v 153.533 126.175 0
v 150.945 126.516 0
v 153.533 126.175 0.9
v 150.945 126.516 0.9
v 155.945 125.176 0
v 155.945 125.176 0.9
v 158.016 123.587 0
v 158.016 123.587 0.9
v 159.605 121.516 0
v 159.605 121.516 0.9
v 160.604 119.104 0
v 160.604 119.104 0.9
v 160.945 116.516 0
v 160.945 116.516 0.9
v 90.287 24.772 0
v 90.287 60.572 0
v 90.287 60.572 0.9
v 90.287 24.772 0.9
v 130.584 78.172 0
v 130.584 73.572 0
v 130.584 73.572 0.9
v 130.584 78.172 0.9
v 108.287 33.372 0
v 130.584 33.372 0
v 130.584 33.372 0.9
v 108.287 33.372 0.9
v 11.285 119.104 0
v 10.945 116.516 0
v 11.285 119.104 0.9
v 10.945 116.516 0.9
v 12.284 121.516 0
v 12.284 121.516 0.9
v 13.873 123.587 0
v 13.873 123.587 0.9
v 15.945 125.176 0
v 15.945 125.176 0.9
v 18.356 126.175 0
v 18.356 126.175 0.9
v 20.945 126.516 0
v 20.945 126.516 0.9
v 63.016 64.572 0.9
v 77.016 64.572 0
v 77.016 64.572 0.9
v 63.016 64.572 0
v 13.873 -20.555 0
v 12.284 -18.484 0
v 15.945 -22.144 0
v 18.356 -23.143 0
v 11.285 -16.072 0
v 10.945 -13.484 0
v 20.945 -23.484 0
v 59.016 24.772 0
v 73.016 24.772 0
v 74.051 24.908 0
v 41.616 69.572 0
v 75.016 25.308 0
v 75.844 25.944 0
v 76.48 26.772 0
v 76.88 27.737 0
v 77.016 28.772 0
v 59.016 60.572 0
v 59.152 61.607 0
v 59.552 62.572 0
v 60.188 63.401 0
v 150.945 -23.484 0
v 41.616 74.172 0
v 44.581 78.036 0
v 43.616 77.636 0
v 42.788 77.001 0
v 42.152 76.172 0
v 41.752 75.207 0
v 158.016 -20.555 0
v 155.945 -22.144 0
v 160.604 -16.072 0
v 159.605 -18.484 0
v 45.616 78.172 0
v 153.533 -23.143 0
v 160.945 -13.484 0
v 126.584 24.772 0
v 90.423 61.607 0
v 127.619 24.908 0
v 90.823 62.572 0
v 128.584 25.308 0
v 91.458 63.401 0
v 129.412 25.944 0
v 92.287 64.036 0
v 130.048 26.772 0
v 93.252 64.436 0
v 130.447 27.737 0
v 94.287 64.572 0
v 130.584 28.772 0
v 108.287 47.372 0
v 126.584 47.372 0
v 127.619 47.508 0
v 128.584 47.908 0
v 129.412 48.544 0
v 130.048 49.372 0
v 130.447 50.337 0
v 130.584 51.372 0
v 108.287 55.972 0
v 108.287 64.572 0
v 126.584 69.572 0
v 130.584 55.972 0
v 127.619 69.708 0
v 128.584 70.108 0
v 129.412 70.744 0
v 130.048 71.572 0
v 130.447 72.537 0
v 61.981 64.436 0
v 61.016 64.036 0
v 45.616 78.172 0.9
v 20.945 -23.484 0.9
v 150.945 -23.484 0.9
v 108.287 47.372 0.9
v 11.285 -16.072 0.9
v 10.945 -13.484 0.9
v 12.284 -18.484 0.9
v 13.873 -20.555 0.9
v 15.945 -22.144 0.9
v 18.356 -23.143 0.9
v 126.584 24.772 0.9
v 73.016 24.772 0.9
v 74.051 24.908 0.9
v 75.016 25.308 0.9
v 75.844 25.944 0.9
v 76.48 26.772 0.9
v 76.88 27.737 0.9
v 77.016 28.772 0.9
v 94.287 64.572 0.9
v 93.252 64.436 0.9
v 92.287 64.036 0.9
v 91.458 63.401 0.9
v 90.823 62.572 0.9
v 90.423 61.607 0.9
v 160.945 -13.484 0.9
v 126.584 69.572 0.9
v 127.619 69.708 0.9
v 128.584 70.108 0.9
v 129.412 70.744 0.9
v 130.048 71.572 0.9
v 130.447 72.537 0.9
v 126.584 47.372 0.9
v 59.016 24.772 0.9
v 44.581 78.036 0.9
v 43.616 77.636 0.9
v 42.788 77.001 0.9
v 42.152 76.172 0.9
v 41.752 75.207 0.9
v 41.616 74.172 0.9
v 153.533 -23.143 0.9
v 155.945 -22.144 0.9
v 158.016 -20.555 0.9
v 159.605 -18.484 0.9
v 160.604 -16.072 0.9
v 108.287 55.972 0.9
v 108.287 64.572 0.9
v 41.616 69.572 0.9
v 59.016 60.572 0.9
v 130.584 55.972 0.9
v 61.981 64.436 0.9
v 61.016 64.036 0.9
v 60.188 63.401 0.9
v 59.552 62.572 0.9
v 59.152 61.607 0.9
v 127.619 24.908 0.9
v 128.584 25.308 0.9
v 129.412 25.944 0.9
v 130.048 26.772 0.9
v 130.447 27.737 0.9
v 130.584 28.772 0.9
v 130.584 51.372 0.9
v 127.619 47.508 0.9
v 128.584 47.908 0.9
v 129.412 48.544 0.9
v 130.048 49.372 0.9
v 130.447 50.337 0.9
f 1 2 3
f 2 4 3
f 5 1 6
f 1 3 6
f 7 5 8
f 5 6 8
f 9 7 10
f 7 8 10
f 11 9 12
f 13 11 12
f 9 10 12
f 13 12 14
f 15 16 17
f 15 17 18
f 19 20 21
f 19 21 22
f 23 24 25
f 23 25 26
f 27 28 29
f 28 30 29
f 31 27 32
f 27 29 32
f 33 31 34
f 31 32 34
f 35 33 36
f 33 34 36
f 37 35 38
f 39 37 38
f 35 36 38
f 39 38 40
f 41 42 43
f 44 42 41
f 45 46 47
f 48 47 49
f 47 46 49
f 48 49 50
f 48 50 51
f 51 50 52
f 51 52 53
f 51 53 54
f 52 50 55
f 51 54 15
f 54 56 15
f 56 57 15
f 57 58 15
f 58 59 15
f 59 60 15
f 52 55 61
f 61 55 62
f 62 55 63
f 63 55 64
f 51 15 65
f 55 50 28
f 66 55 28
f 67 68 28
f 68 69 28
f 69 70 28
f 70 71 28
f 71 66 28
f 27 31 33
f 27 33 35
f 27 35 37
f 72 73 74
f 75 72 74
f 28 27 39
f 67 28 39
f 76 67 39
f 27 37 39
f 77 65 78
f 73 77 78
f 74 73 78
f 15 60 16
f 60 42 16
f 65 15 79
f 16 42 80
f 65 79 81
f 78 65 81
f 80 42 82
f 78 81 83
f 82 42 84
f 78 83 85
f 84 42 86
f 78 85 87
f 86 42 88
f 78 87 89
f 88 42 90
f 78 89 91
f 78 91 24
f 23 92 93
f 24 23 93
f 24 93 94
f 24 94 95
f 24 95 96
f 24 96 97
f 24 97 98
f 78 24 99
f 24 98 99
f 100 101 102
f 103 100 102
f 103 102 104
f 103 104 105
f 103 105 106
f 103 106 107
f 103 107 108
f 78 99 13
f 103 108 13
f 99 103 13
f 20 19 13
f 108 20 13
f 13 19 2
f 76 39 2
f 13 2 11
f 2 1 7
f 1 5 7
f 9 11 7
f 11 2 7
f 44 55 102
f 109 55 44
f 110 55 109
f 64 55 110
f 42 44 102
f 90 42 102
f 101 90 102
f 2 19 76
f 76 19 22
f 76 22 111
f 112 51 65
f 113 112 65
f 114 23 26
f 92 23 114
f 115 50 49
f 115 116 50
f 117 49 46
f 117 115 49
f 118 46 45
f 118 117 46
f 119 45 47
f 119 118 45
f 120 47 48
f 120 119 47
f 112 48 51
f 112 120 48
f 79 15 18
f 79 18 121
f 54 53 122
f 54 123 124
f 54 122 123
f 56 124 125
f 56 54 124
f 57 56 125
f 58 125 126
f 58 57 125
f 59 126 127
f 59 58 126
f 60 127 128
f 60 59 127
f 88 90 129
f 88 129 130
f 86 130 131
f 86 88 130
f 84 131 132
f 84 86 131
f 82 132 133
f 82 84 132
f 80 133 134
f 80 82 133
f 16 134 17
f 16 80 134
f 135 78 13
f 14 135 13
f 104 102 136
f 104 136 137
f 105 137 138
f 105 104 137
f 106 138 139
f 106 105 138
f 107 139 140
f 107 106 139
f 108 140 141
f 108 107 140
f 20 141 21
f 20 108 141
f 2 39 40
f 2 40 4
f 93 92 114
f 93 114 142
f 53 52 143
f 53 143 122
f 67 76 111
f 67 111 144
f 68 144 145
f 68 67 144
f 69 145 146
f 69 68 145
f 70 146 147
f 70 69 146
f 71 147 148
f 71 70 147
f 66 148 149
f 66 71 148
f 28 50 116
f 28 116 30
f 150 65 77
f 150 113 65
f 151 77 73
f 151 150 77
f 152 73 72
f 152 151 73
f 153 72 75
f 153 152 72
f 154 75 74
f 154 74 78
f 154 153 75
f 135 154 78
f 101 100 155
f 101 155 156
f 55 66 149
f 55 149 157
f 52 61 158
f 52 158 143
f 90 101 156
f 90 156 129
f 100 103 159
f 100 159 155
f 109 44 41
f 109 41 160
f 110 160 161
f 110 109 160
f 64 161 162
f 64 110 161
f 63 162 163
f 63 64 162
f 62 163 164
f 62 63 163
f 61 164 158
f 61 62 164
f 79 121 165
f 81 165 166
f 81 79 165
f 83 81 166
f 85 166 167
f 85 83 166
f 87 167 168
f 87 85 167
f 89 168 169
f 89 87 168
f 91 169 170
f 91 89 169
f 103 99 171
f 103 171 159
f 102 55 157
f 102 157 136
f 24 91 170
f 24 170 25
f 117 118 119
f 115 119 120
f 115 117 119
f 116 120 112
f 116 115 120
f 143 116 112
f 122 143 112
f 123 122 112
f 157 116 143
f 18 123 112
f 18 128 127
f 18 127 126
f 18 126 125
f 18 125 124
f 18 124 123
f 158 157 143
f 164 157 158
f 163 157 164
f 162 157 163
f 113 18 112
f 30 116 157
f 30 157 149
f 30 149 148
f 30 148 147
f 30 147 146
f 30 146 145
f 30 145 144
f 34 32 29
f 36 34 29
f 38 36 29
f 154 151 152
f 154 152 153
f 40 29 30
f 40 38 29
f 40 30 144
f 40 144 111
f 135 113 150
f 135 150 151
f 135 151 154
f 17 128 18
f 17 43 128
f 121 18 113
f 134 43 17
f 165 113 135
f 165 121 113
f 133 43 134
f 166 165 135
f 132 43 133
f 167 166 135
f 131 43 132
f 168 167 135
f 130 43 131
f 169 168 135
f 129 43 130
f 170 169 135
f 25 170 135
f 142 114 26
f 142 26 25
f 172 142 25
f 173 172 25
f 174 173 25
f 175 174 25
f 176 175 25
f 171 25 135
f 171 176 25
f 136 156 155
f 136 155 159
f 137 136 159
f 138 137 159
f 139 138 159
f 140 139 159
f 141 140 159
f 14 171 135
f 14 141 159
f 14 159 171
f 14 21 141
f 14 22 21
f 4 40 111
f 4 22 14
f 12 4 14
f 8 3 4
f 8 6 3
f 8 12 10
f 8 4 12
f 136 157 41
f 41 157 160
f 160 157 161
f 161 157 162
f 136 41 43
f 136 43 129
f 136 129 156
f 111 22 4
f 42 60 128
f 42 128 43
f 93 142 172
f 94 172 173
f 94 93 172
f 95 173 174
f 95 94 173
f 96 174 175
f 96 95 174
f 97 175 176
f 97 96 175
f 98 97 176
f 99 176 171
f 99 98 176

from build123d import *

# Parameters (mm, degrees)
F1_W     = 75
F1_H     = 75
F2_DEPTH = 0.45
F3_DEPTH = 0.451
F4_SCALE = 2
F5_R     = 10


with BuildPart() as f2:
    # F1 (on Top) → F2 (new body)
    with BuildSketch(Plane.XY):
        with Locations((42.972257086, 25.7581188657)):
            Rectangle(F1_W, F1_H)
    extrude(amount=F2_DEPTH)

    # F0 (on Top) → F3 (cut, through all)
    with BuildSketch(Plane.XY):
        with BuildLine():
            Line((20.8079852164, 34.7860567272), (63.291762352, 34.7860567272))
            ThreePointArc((63.291762352, 34.7860567272), (64.7059759144, 35.3718431648), (65.291762352, 36.7860567272))
            Line((65.291762352, 36.7860567272), (65.291762352, 39.0860567272))
            Line((65.291762352, 39.0860567272), (22.8079852164, 39.0860567272))
            ThreePointArc((22.8079852164, 39.0860567272), (21.393771654, 38.5002702895), (20.8079852164, 37.0860567272))
            Line((20.8079852164, 37.0860567272), (20.8079852164, 34.7860567272))
        make_face()
        with BuildLine():
            Line((38.5079852164, 14.3860567272), (38.5079852164, 32.2860567272))
            Line((38.5079852164, 32.2860567272), (31.5079852164, 32.2860567272))
            ThreePointArc((31.5079852164, 32.2860567272), (30.093771654, 31.7002702895), (29.5079852164, 30.2860567272))
            Line((29.5079852164, 30.2860567272), (29.5079852164, 12.3860567272))
            Line((29.5079852164, 12.3860567272), (36.5079852164, 12.3860567272))
            ThreePointArc((36.5079852164, 12.3860567272), (37.9221987788, 12.9718431648), (38.5079852164, 14.3860567272))
        make_face()
        with BuildLine():
            Line((54.1434029907, 27.9860567272), (54.1434029907, 32.2860567272))
            Line((54.1434029907, 32.2860567272), (47.1434029907, 32.2860567272))
            ThreePointArc((47.1434029907, 32.2860567272), (45.7291894283, 31.7002702895), (45.1434029907, 30.2860567272))
            Line((45.1434029907, 30.2860567272), (45.1434029907, 12.3860567272))
            Line((45.1434029907, 12.3860567272), (54.1434029907, 12.3860567272))
            Line((54.1434029907, 12.3860567272), (54.1434029907, 16.6860567272))
            Line((54.1434029907, 16.6860567272), (54.1434029907, 23.6860567272))
            Line((54.1434029907, 23.6860567272), (54.1434029907, 27.9860567272))
        make_face()
        with BuildLine():
            Line((65.291762352, 27.9860567272), (54.1434029907, 27.9860567272))
            Line((54.1434029907, 27.9860567272), (54.1434029907, 23.6860567272))
            Line((54.1434029907, 23.6860567272), (63.291762352, 23.6860567272))
            ThreePointArc((63.291762352, 23.6860567272), (64.7059759144, 24.2718431648), (65.291762352, 25.6860567272))
            Line((65.291762352, 25.6860567272), (65.291762352, 27.9860567272))
        make_face()
        with BuildLine():
            Line((65.291762352, 16.6860567272), (54.1434029907, 16.6860567272))
            Line((54.1434029907, 16.6860567272), (54.1434029907, 12.3860567272))
            Line((54.1434029907, 12.3860567272), (63.291762352, 12.3860567272))
            ThreePointArc((63.291762352, 12.3860567272), (64.7059759144, 12.9718431648), (65.291762352, 14.3860567272))
            Line((65.291762352, 14.3860567272), (65.291762352, 16.6860567272))
        make_face()
    extrude(amount=F3_DEPTH, mode=Mode.SUBTRACT)


with BuildPart() as f2_1:
    # F4: moved
    add(f2.part.scale(F4_SCALE))

    # F5
    f5_edges = [f2_1.edges().sort_by_distance(p)[0] for p in [
        (160.944514, -23.483762, 0.45),
        (10.944514, -23.483762, 0.45),
        (10.944514, 126.516238, 0.45),
        (160.944514, 126.516238, 0.45),
    ]]
    fillet(f5_edges, radius=F5_R)


solid = f2_1.part
